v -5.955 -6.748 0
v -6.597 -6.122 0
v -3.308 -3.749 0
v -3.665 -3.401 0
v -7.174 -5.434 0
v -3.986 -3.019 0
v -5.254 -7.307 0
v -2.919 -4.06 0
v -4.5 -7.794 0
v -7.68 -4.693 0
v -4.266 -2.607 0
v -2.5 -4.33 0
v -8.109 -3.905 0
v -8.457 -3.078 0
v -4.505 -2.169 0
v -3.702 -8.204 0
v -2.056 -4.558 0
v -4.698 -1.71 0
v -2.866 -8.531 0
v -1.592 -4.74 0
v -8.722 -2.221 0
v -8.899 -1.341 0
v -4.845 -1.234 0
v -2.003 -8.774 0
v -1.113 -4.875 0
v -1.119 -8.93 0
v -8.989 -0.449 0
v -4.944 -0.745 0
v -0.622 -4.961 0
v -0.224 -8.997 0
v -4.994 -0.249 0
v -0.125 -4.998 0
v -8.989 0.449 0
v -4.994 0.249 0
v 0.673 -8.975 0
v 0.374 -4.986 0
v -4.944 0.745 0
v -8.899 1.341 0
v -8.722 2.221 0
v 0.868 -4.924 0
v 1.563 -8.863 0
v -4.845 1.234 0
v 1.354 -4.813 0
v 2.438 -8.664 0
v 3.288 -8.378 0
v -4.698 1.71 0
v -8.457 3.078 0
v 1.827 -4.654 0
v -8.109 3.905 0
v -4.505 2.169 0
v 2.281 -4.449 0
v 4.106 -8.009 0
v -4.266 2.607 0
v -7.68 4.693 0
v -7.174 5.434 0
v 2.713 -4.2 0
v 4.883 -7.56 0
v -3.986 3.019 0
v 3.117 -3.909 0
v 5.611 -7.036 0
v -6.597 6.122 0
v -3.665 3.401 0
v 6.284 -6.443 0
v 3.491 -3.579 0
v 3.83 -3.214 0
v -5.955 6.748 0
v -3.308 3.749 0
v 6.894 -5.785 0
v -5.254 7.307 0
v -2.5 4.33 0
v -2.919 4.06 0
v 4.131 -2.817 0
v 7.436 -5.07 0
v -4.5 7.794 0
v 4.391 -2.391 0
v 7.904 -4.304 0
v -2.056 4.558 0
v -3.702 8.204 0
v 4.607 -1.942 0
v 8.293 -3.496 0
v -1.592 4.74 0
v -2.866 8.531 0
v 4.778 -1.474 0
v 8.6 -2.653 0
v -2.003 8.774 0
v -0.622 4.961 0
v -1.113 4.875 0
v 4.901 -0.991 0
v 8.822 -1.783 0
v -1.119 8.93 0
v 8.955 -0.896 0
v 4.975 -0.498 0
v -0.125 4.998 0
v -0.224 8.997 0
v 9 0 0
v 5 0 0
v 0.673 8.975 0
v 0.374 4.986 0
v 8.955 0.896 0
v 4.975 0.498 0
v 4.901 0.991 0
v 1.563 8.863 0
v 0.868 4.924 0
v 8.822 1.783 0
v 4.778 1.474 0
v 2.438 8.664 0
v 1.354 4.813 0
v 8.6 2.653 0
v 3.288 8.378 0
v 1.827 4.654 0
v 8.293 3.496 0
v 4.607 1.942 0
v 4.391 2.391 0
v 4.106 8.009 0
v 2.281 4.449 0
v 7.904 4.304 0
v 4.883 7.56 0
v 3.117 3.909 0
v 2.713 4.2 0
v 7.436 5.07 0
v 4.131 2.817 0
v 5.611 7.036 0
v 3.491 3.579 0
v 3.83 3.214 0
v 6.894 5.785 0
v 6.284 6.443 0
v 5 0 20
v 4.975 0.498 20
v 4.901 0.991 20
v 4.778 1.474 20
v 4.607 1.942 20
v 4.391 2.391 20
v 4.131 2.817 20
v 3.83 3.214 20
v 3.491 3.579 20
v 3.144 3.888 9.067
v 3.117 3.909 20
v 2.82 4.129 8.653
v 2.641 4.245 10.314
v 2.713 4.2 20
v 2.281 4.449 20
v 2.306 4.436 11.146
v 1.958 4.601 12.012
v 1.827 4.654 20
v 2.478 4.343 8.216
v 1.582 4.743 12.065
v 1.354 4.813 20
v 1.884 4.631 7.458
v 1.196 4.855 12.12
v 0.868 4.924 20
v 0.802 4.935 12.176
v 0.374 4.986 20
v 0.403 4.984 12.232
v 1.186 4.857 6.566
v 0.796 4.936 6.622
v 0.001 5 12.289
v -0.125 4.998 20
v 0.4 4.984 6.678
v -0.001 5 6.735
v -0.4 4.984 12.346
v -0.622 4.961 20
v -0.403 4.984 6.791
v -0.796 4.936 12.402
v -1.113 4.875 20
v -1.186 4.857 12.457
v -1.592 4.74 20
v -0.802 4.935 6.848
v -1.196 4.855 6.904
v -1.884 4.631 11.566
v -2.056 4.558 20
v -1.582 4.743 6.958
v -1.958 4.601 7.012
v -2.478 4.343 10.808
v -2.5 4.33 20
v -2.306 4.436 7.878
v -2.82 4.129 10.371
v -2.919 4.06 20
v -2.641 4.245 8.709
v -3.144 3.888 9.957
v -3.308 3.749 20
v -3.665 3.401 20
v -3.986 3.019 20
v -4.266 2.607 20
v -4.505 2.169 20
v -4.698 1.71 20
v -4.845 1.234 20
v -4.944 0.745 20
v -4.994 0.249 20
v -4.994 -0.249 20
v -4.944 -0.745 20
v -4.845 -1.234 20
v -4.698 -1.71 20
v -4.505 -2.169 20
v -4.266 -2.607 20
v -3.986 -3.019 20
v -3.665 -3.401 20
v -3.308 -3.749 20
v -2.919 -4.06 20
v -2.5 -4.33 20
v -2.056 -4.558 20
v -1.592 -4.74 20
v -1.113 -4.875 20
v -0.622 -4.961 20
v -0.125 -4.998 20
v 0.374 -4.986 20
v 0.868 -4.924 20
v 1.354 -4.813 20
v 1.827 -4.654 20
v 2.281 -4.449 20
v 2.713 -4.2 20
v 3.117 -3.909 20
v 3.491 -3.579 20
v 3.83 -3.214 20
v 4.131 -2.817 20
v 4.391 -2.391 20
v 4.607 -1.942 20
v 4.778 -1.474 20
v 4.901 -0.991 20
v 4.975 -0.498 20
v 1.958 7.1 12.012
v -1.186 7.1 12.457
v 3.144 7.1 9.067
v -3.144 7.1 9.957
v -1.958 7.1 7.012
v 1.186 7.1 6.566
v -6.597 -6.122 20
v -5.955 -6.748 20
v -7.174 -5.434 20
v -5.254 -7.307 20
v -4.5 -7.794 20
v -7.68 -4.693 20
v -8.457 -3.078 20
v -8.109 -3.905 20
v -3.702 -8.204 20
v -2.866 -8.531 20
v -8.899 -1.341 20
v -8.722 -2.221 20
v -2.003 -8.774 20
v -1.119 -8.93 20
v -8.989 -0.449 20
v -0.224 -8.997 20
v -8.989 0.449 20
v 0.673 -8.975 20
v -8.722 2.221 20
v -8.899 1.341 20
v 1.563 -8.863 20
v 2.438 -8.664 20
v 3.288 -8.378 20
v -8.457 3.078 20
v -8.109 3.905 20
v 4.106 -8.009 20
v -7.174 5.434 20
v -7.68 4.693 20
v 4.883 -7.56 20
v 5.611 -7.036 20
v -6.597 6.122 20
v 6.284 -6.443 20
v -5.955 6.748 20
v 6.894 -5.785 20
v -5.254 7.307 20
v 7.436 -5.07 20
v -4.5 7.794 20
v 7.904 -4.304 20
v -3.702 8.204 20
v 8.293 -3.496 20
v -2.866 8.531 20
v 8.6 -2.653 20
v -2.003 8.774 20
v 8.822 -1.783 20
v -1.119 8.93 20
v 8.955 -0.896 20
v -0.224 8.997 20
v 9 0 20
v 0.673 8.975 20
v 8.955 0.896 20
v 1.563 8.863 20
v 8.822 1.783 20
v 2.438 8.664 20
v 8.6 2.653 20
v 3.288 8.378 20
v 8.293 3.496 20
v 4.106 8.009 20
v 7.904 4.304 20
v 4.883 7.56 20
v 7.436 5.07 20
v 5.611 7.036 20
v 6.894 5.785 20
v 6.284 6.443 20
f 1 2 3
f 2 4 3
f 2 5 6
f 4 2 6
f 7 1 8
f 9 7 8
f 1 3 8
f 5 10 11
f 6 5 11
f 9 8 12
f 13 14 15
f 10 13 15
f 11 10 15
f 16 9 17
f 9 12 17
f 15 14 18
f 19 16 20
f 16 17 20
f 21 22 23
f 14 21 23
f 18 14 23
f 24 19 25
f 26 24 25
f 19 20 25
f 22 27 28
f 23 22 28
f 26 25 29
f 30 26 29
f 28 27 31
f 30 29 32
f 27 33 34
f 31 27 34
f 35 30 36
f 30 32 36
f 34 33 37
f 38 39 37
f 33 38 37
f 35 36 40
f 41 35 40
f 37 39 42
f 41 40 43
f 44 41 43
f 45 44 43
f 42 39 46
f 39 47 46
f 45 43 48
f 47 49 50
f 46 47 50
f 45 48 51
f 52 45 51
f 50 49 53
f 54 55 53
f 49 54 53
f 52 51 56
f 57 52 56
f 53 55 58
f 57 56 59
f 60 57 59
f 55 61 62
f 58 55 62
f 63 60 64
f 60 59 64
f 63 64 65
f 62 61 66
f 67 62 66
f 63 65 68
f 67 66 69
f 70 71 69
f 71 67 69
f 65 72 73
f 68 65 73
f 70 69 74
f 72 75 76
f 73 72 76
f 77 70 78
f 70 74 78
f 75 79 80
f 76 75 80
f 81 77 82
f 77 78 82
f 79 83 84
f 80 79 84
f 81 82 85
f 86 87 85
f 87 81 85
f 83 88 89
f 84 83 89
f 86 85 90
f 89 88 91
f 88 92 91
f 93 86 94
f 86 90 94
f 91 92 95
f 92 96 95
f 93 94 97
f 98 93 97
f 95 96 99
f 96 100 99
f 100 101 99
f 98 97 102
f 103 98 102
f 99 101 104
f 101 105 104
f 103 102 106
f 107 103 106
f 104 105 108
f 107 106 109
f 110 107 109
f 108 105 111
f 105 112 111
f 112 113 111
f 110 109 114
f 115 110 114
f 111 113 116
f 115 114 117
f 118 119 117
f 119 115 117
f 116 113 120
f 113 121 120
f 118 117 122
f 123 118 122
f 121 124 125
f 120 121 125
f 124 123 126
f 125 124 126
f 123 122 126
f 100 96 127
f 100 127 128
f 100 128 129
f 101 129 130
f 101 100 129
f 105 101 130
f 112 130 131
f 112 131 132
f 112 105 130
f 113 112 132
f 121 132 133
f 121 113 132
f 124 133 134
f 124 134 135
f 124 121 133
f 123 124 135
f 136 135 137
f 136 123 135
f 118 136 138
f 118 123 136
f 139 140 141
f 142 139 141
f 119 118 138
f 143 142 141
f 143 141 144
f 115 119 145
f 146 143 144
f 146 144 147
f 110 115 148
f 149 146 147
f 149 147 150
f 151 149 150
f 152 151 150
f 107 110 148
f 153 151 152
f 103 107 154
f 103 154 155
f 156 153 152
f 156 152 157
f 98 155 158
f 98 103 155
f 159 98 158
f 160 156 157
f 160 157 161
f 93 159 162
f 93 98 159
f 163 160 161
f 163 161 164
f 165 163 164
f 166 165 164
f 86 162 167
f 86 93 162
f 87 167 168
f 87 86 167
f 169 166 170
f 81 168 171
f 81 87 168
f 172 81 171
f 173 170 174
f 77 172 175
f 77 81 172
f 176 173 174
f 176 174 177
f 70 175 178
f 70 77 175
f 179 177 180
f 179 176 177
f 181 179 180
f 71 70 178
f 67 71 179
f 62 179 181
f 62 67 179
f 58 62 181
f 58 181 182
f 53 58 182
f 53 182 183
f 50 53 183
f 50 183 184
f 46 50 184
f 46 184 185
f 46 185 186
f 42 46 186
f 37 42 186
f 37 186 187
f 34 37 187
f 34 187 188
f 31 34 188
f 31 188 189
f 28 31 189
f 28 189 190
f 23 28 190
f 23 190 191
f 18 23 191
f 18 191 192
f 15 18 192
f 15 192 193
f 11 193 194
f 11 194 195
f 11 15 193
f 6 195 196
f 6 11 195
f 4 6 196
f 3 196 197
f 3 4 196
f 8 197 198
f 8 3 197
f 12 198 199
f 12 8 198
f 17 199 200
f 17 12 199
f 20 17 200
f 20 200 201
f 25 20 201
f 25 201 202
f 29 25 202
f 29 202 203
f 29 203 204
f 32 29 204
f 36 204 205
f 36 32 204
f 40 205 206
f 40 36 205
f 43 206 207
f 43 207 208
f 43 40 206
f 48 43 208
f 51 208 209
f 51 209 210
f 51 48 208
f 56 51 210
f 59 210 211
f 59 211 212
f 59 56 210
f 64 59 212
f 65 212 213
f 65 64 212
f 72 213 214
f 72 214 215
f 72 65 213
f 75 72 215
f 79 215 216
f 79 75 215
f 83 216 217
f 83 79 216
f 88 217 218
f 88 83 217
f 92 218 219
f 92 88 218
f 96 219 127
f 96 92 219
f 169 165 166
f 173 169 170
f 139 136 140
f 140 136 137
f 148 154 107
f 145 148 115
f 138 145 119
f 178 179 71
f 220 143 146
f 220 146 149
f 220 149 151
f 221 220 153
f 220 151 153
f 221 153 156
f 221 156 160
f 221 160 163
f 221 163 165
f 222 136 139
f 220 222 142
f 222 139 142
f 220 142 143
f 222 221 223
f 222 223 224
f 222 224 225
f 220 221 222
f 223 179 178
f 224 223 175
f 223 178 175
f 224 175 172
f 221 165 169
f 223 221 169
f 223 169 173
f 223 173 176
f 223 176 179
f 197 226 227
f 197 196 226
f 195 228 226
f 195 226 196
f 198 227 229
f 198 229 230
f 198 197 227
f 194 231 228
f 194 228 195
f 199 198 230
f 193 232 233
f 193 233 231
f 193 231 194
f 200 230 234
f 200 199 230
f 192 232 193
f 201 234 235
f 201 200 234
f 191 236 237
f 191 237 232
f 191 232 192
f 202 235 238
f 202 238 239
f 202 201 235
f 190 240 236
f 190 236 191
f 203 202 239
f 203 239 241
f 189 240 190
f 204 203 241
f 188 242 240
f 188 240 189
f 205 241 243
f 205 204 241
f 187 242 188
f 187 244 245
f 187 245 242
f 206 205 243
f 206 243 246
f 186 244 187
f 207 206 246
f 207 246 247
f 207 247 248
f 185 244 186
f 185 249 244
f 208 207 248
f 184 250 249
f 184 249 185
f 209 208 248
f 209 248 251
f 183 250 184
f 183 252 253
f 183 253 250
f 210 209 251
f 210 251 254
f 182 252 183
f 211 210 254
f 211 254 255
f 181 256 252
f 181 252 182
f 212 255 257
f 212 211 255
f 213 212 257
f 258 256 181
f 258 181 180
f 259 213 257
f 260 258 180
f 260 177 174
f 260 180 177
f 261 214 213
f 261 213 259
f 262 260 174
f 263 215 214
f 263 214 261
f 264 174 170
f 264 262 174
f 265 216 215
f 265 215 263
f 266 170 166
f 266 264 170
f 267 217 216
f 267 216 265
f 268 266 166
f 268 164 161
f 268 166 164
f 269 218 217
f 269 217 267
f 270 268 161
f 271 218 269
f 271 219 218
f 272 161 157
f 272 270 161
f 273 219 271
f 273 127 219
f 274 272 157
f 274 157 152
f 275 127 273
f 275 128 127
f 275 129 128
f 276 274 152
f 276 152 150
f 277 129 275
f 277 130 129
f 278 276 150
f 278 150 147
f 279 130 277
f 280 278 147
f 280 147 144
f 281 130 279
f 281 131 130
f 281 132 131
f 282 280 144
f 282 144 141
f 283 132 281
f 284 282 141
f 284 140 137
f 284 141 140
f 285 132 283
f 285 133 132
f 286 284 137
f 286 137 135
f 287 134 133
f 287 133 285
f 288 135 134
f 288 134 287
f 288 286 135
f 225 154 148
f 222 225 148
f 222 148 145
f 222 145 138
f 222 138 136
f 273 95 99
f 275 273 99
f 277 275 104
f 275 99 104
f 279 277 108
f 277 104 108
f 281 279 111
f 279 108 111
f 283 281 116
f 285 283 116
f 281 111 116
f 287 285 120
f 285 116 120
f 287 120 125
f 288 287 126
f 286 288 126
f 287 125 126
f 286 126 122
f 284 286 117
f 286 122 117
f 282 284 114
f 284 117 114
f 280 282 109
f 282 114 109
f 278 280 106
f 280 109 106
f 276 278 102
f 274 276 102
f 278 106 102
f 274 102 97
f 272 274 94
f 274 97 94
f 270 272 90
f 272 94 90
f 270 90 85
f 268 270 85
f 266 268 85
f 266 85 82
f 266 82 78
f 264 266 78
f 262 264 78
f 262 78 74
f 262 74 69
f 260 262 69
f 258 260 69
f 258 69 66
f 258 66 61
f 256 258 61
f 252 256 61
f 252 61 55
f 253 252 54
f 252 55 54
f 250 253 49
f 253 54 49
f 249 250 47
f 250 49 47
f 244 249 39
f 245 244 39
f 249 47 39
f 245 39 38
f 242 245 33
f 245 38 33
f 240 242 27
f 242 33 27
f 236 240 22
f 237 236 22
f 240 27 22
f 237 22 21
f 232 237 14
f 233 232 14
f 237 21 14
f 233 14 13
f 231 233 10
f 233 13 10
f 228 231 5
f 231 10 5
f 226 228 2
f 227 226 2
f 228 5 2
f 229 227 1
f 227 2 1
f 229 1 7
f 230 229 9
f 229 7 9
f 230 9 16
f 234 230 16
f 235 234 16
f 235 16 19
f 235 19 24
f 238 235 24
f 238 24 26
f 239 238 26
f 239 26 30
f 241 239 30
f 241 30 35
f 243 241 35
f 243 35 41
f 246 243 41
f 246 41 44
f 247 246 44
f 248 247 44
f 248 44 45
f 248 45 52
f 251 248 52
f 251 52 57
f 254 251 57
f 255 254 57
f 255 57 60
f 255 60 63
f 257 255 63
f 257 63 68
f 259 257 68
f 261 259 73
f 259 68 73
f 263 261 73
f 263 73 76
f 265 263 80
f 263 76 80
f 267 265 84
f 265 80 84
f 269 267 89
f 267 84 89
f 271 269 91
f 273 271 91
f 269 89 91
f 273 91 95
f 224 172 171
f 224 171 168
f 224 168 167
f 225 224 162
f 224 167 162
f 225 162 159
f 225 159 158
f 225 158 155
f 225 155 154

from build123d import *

# Parameters (mm, degrees)
F0_R     = 9
F0_R_2   = 5
F1_DEPTH = 20
F2_R     = 1.6
F3_DEPTH = 7.1


with BuildPart() as f1:
    # F0 (on Top) → F1 (new body)
    with BuildSketch(Plane.XY):
        Circle(F0_R)
        Circle(F0_R_2, mode=Mode.SUBTRACT)
    extrude(amount=F1_DEPTH)

    # F2 (on Front) → F3 (cut)
    with BuildSketch(Plane.XZ):
        Polygon((-1.186389, 12.457307), (-3.144049, 9.957127), (-1.957661, 7.011654), (1.186389, 6.566359), (3.144049, 9.066539), (1.957661, 12.012013), align=None)
        with Locations((0, 9.511833)):
            Circle(F2_R, mode=Mode.SUBTRACT)
        with Locations((0, 9.511833)):
            Circle(F2_R)
    extrude(amount=-F3_DEPTH, mode=Mode.SUBTRACT)


solid = f1.part
